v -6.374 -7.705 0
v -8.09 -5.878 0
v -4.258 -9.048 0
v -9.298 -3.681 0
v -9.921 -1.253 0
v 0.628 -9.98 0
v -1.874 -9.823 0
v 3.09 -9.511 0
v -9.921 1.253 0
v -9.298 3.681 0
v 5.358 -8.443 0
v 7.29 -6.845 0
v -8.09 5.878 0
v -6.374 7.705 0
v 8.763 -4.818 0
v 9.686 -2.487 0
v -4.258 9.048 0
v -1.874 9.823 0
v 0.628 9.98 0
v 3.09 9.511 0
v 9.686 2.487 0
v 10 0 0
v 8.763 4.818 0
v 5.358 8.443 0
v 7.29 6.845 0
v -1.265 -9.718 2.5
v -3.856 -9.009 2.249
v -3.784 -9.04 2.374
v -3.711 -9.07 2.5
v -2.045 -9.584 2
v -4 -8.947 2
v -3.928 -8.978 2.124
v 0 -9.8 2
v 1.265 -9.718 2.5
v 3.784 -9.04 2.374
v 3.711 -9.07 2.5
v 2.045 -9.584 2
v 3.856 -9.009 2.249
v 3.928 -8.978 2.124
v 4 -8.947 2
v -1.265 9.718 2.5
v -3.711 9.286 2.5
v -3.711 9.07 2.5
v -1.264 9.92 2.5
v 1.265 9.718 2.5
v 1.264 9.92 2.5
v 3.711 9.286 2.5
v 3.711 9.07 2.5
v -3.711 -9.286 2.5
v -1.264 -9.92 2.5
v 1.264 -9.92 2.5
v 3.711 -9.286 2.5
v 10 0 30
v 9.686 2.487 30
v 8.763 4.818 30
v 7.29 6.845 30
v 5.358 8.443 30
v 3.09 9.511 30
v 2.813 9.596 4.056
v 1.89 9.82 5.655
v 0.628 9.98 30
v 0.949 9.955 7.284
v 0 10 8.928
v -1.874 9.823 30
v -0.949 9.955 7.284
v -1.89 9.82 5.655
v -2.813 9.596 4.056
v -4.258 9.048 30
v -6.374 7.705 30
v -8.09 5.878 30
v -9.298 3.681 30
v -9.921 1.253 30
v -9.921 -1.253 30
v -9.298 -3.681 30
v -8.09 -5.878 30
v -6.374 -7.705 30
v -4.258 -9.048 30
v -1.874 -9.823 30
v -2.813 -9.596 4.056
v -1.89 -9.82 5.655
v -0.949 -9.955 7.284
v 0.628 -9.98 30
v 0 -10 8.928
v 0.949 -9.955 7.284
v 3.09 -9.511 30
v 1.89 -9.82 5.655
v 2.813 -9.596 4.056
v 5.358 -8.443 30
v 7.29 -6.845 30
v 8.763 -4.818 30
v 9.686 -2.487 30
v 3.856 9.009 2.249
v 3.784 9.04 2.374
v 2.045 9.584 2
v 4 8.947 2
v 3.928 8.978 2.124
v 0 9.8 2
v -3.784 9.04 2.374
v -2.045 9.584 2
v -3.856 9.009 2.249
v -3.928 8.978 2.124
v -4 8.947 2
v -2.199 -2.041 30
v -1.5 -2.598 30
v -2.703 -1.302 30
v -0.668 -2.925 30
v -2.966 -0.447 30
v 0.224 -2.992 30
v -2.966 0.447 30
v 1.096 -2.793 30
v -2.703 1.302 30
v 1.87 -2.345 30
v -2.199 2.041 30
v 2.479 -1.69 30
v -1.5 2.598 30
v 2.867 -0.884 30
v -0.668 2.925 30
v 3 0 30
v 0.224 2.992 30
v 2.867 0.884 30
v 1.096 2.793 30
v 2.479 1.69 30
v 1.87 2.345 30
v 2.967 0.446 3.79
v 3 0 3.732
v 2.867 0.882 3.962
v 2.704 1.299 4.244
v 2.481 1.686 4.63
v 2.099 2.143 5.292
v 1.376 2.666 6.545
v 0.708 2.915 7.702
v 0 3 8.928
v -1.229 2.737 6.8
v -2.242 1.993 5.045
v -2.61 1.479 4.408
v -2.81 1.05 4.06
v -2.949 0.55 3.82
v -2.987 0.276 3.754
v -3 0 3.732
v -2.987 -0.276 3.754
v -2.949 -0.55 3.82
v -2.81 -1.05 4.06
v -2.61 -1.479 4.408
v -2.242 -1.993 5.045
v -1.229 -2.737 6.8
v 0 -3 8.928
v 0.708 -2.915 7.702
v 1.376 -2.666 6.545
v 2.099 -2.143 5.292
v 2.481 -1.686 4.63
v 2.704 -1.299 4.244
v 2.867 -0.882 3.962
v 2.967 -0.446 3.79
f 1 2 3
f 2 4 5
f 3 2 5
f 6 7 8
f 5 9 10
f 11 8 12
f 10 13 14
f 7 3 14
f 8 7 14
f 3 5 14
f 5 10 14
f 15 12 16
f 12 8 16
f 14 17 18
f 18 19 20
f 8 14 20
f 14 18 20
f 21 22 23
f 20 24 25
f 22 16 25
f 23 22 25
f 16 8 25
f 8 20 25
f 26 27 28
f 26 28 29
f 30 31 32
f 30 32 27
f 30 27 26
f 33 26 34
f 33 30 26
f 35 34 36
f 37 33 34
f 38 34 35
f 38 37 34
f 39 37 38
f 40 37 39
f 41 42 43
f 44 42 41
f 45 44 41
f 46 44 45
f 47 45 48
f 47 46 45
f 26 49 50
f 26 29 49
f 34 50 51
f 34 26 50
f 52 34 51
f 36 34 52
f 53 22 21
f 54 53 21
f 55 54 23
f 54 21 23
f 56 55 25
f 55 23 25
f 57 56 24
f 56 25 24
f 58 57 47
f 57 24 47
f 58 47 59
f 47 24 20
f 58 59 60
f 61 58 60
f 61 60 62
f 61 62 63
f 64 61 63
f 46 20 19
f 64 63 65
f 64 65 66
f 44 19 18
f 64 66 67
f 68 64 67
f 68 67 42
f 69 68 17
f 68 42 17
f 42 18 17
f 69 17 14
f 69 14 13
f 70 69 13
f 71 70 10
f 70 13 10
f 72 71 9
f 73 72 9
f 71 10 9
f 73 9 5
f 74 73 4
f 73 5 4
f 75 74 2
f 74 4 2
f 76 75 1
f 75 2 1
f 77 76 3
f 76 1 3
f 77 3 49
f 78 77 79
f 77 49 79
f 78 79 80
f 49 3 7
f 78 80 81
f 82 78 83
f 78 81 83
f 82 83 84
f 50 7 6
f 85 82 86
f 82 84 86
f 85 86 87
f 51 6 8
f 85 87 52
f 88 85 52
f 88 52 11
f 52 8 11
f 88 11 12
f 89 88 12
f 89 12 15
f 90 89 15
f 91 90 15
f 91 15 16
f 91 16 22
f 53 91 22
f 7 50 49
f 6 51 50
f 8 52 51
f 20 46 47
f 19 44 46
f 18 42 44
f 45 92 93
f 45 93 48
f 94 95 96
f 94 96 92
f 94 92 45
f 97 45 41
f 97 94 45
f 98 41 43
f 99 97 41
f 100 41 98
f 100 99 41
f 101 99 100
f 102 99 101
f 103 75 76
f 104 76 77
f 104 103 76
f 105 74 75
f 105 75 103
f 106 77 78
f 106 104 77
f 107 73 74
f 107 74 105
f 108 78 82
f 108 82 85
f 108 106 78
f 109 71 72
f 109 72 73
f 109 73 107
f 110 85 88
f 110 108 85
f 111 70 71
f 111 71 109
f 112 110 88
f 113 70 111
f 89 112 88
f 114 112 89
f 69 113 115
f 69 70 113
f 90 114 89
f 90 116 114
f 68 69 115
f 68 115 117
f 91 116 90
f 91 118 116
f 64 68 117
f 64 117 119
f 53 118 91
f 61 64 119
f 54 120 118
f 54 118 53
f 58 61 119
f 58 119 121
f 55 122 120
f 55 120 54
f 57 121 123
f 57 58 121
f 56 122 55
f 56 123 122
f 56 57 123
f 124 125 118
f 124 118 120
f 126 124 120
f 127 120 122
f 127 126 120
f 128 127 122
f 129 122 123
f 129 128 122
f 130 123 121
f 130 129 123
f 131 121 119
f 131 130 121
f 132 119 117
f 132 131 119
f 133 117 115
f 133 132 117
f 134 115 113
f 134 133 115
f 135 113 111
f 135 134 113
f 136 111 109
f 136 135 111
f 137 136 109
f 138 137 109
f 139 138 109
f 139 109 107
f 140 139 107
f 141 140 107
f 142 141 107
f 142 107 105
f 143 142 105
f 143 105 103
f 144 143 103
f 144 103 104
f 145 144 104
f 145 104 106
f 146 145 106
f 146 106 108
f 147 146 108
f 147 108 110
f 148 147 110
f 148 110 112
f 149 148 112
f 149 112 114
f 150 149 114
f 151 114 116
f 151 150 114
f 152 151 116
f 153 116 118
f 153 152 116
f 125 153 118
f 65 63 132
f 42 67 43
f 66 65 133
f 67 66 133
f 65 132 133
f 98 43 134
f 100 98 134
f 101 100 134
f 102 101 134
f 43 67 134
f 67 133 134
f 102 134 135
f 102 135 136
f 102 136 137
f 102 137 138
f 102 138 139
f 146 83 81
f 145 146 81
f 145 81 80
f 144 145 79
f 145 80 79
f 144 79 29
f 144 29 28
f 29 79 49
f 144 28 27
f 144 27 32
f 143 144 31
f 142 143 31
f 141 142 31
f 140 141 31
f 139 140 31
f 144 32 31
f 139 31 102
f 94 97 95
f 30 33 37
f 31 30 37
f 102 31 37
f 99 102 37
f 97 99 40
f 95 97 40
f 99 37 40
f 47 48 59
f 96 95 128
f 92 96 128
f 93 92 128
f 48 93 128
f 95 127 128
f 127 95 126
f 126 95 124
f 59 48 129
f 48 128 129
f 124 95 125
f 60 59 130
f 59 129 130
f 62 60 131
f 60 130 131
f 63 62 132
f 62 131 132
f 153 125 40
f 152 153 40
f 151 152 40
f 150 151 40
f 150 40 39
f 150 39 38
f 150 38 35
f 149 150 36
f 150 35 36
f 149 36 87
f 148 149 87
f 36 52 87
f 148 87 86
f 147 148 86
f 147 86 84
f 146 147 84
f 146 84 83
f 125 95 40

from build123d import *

# Parameters (mm, degrees)
F0_R          = 10
F0_R_2        = 9.8
F0_R_3        = 3
F2_DEPTH      = 2
F3_DEPTH      = 30
F4_DEPTH      = 25
F4_DEPTH_BACK = 25
F5_DEPTH      = 2.5


with BuildPart() as f2:
    # F0 (on Top) → F2 (new body)
    with BuildSketch(Plane.XY):
        Circle(F0_R)
        Circle(F0_R_2, mode=Mode.SUBTRACT)
        Circle(F0_R_2)
        Circle(F0_R_3, mode=Mode.SUBTRACT)
        Circle(F0_R_3)
    extrude(amount=F2_DEPTH)

    # F0 (on Top) → F3 (join)
    with BuildSketch(Plane.XY):
        Circle(F0_R)
        Circle(F0_R_2, mode=Mode.SUBTRACT)
        Circle(F0_R_2)
        Circle(F0_R_3, mode=Mode.SUBTRACT)
    extrude(amount=F3_DEPTH)

    # F1 (on Front) → F4 (cut, two sides)
    with BuildSketch(Plane.XZ) as f4_sk:
        Polygon((-4, 2), (0, 2), (4, 2), (0, 8.9282032303), align=None)
    extrude(amount=F4_DEPTH, mode=Mode.SUBTRACT)
    extrude(f4_sk.sketch, amount=-F4_DEPTH_BACK, mode=Mode.SUBTRACT)

    # F0 (on Top) → F5 (join)
    with BuildSketch(Plane.XY):
        Circle(F0_R)
        Circle(F0_R_2, mode=Mode.SUBTRACT)
    extrude(amount=F5_DEPTH)


solid = f2.part
